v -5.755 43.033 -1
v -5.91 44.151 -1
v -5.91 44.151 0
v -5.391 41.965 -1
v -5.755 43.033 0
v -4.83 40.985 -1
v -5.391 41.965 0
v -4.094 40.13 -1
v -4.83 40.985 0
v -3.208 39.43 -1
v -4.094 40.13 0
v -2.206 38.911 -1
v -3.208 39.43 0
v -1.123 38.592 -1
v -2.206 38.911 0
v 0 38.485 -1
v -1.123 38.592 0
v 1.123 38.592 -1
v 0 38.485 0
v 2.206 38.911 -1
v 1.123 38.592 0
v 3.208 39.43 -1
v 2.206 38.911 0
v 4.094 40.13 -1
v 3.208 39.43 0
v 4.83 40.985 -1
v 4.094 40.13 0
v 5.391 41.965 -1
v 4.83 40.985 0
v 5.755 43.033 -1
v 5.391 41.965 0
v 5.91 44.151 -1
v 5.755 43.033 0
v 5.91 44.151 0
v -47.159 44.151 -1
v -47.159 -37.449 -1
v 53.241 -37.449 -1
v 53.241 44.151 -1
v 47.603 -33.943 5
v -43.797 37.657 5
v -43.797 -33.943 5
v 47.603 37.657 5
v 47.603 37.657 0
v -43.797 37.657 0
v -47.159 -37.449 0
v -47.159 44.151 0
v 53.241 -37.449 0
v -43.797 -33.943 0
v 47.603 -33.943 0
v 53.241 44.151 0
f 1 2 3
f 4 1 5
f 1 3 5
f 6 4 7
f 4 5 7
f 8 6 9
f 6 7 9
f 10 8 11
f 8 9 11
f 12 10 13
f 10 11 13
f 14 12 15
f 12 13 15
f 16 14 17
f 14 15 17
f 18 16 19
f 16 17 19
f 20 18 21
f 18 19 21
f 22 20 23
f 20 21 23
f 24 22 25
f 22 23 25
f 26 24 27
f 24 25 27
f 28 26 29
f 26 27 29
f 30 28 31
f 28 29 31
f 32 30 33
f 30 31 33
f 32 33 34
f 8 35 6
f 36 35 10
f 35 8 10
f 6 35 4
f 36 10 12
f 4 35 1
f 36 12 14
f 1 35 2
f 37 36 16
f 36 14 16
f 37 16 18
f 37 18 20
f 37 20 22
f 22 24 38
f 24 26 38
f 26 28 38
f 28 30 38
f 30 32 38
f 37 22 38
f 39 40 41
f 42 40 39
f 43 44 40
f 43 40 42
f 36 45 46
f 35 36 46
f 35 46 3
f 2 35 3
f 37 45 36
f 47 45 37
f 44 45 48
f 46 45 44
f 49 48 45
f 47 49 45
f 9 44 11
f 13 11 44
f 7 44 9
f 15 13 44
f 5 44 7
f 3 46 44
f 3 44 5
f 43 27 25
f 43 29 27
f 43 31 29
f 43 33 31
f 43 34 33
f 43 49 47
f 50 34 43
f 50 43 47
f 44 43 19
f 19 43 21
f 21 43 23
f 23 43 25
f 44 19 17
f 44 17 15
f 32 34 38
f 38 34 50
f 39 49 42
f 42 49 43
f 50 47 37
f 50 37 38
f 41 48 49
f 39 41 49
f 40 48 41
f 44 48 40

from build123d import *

# Parameters (mm, degrees)
F0_W     = 100.4
F0_H     = 81.6
F1_DEPTH = 1
F2_W     = 91.4
F2_H     = 71.6
F3_DEPTH = 5
F4_R     = 5.91518
F5_DEPTH = 25.4


with BuildPart() as f1:
    # F0 (on Top) → F1 (new body)
    with BuildSketch(Plane.XY):
        with Locations((3.041083, 3.351103)):
            Rectangle(F0_W, F0_H)
    extrude(amount=-F1_DEPTH)

    # F2 (on Top) → F3 (join)
    with BuildSketch(Plane.XY):
        with Locations((1.90348, 1.857489)):
            Rectangle(F2_W, F2_H)
    extrude(amount=F3_DEPTH)

    # F4 (on Top) → F5 (cut)
    with BuildSketch(Plane.XY):
        with Locations((0, 44.399735)):
            Circle(F4_R)
    extrude(amount=-F5_DEPTH, mode=Mode.SUBTRACT)


solid = f1.part
